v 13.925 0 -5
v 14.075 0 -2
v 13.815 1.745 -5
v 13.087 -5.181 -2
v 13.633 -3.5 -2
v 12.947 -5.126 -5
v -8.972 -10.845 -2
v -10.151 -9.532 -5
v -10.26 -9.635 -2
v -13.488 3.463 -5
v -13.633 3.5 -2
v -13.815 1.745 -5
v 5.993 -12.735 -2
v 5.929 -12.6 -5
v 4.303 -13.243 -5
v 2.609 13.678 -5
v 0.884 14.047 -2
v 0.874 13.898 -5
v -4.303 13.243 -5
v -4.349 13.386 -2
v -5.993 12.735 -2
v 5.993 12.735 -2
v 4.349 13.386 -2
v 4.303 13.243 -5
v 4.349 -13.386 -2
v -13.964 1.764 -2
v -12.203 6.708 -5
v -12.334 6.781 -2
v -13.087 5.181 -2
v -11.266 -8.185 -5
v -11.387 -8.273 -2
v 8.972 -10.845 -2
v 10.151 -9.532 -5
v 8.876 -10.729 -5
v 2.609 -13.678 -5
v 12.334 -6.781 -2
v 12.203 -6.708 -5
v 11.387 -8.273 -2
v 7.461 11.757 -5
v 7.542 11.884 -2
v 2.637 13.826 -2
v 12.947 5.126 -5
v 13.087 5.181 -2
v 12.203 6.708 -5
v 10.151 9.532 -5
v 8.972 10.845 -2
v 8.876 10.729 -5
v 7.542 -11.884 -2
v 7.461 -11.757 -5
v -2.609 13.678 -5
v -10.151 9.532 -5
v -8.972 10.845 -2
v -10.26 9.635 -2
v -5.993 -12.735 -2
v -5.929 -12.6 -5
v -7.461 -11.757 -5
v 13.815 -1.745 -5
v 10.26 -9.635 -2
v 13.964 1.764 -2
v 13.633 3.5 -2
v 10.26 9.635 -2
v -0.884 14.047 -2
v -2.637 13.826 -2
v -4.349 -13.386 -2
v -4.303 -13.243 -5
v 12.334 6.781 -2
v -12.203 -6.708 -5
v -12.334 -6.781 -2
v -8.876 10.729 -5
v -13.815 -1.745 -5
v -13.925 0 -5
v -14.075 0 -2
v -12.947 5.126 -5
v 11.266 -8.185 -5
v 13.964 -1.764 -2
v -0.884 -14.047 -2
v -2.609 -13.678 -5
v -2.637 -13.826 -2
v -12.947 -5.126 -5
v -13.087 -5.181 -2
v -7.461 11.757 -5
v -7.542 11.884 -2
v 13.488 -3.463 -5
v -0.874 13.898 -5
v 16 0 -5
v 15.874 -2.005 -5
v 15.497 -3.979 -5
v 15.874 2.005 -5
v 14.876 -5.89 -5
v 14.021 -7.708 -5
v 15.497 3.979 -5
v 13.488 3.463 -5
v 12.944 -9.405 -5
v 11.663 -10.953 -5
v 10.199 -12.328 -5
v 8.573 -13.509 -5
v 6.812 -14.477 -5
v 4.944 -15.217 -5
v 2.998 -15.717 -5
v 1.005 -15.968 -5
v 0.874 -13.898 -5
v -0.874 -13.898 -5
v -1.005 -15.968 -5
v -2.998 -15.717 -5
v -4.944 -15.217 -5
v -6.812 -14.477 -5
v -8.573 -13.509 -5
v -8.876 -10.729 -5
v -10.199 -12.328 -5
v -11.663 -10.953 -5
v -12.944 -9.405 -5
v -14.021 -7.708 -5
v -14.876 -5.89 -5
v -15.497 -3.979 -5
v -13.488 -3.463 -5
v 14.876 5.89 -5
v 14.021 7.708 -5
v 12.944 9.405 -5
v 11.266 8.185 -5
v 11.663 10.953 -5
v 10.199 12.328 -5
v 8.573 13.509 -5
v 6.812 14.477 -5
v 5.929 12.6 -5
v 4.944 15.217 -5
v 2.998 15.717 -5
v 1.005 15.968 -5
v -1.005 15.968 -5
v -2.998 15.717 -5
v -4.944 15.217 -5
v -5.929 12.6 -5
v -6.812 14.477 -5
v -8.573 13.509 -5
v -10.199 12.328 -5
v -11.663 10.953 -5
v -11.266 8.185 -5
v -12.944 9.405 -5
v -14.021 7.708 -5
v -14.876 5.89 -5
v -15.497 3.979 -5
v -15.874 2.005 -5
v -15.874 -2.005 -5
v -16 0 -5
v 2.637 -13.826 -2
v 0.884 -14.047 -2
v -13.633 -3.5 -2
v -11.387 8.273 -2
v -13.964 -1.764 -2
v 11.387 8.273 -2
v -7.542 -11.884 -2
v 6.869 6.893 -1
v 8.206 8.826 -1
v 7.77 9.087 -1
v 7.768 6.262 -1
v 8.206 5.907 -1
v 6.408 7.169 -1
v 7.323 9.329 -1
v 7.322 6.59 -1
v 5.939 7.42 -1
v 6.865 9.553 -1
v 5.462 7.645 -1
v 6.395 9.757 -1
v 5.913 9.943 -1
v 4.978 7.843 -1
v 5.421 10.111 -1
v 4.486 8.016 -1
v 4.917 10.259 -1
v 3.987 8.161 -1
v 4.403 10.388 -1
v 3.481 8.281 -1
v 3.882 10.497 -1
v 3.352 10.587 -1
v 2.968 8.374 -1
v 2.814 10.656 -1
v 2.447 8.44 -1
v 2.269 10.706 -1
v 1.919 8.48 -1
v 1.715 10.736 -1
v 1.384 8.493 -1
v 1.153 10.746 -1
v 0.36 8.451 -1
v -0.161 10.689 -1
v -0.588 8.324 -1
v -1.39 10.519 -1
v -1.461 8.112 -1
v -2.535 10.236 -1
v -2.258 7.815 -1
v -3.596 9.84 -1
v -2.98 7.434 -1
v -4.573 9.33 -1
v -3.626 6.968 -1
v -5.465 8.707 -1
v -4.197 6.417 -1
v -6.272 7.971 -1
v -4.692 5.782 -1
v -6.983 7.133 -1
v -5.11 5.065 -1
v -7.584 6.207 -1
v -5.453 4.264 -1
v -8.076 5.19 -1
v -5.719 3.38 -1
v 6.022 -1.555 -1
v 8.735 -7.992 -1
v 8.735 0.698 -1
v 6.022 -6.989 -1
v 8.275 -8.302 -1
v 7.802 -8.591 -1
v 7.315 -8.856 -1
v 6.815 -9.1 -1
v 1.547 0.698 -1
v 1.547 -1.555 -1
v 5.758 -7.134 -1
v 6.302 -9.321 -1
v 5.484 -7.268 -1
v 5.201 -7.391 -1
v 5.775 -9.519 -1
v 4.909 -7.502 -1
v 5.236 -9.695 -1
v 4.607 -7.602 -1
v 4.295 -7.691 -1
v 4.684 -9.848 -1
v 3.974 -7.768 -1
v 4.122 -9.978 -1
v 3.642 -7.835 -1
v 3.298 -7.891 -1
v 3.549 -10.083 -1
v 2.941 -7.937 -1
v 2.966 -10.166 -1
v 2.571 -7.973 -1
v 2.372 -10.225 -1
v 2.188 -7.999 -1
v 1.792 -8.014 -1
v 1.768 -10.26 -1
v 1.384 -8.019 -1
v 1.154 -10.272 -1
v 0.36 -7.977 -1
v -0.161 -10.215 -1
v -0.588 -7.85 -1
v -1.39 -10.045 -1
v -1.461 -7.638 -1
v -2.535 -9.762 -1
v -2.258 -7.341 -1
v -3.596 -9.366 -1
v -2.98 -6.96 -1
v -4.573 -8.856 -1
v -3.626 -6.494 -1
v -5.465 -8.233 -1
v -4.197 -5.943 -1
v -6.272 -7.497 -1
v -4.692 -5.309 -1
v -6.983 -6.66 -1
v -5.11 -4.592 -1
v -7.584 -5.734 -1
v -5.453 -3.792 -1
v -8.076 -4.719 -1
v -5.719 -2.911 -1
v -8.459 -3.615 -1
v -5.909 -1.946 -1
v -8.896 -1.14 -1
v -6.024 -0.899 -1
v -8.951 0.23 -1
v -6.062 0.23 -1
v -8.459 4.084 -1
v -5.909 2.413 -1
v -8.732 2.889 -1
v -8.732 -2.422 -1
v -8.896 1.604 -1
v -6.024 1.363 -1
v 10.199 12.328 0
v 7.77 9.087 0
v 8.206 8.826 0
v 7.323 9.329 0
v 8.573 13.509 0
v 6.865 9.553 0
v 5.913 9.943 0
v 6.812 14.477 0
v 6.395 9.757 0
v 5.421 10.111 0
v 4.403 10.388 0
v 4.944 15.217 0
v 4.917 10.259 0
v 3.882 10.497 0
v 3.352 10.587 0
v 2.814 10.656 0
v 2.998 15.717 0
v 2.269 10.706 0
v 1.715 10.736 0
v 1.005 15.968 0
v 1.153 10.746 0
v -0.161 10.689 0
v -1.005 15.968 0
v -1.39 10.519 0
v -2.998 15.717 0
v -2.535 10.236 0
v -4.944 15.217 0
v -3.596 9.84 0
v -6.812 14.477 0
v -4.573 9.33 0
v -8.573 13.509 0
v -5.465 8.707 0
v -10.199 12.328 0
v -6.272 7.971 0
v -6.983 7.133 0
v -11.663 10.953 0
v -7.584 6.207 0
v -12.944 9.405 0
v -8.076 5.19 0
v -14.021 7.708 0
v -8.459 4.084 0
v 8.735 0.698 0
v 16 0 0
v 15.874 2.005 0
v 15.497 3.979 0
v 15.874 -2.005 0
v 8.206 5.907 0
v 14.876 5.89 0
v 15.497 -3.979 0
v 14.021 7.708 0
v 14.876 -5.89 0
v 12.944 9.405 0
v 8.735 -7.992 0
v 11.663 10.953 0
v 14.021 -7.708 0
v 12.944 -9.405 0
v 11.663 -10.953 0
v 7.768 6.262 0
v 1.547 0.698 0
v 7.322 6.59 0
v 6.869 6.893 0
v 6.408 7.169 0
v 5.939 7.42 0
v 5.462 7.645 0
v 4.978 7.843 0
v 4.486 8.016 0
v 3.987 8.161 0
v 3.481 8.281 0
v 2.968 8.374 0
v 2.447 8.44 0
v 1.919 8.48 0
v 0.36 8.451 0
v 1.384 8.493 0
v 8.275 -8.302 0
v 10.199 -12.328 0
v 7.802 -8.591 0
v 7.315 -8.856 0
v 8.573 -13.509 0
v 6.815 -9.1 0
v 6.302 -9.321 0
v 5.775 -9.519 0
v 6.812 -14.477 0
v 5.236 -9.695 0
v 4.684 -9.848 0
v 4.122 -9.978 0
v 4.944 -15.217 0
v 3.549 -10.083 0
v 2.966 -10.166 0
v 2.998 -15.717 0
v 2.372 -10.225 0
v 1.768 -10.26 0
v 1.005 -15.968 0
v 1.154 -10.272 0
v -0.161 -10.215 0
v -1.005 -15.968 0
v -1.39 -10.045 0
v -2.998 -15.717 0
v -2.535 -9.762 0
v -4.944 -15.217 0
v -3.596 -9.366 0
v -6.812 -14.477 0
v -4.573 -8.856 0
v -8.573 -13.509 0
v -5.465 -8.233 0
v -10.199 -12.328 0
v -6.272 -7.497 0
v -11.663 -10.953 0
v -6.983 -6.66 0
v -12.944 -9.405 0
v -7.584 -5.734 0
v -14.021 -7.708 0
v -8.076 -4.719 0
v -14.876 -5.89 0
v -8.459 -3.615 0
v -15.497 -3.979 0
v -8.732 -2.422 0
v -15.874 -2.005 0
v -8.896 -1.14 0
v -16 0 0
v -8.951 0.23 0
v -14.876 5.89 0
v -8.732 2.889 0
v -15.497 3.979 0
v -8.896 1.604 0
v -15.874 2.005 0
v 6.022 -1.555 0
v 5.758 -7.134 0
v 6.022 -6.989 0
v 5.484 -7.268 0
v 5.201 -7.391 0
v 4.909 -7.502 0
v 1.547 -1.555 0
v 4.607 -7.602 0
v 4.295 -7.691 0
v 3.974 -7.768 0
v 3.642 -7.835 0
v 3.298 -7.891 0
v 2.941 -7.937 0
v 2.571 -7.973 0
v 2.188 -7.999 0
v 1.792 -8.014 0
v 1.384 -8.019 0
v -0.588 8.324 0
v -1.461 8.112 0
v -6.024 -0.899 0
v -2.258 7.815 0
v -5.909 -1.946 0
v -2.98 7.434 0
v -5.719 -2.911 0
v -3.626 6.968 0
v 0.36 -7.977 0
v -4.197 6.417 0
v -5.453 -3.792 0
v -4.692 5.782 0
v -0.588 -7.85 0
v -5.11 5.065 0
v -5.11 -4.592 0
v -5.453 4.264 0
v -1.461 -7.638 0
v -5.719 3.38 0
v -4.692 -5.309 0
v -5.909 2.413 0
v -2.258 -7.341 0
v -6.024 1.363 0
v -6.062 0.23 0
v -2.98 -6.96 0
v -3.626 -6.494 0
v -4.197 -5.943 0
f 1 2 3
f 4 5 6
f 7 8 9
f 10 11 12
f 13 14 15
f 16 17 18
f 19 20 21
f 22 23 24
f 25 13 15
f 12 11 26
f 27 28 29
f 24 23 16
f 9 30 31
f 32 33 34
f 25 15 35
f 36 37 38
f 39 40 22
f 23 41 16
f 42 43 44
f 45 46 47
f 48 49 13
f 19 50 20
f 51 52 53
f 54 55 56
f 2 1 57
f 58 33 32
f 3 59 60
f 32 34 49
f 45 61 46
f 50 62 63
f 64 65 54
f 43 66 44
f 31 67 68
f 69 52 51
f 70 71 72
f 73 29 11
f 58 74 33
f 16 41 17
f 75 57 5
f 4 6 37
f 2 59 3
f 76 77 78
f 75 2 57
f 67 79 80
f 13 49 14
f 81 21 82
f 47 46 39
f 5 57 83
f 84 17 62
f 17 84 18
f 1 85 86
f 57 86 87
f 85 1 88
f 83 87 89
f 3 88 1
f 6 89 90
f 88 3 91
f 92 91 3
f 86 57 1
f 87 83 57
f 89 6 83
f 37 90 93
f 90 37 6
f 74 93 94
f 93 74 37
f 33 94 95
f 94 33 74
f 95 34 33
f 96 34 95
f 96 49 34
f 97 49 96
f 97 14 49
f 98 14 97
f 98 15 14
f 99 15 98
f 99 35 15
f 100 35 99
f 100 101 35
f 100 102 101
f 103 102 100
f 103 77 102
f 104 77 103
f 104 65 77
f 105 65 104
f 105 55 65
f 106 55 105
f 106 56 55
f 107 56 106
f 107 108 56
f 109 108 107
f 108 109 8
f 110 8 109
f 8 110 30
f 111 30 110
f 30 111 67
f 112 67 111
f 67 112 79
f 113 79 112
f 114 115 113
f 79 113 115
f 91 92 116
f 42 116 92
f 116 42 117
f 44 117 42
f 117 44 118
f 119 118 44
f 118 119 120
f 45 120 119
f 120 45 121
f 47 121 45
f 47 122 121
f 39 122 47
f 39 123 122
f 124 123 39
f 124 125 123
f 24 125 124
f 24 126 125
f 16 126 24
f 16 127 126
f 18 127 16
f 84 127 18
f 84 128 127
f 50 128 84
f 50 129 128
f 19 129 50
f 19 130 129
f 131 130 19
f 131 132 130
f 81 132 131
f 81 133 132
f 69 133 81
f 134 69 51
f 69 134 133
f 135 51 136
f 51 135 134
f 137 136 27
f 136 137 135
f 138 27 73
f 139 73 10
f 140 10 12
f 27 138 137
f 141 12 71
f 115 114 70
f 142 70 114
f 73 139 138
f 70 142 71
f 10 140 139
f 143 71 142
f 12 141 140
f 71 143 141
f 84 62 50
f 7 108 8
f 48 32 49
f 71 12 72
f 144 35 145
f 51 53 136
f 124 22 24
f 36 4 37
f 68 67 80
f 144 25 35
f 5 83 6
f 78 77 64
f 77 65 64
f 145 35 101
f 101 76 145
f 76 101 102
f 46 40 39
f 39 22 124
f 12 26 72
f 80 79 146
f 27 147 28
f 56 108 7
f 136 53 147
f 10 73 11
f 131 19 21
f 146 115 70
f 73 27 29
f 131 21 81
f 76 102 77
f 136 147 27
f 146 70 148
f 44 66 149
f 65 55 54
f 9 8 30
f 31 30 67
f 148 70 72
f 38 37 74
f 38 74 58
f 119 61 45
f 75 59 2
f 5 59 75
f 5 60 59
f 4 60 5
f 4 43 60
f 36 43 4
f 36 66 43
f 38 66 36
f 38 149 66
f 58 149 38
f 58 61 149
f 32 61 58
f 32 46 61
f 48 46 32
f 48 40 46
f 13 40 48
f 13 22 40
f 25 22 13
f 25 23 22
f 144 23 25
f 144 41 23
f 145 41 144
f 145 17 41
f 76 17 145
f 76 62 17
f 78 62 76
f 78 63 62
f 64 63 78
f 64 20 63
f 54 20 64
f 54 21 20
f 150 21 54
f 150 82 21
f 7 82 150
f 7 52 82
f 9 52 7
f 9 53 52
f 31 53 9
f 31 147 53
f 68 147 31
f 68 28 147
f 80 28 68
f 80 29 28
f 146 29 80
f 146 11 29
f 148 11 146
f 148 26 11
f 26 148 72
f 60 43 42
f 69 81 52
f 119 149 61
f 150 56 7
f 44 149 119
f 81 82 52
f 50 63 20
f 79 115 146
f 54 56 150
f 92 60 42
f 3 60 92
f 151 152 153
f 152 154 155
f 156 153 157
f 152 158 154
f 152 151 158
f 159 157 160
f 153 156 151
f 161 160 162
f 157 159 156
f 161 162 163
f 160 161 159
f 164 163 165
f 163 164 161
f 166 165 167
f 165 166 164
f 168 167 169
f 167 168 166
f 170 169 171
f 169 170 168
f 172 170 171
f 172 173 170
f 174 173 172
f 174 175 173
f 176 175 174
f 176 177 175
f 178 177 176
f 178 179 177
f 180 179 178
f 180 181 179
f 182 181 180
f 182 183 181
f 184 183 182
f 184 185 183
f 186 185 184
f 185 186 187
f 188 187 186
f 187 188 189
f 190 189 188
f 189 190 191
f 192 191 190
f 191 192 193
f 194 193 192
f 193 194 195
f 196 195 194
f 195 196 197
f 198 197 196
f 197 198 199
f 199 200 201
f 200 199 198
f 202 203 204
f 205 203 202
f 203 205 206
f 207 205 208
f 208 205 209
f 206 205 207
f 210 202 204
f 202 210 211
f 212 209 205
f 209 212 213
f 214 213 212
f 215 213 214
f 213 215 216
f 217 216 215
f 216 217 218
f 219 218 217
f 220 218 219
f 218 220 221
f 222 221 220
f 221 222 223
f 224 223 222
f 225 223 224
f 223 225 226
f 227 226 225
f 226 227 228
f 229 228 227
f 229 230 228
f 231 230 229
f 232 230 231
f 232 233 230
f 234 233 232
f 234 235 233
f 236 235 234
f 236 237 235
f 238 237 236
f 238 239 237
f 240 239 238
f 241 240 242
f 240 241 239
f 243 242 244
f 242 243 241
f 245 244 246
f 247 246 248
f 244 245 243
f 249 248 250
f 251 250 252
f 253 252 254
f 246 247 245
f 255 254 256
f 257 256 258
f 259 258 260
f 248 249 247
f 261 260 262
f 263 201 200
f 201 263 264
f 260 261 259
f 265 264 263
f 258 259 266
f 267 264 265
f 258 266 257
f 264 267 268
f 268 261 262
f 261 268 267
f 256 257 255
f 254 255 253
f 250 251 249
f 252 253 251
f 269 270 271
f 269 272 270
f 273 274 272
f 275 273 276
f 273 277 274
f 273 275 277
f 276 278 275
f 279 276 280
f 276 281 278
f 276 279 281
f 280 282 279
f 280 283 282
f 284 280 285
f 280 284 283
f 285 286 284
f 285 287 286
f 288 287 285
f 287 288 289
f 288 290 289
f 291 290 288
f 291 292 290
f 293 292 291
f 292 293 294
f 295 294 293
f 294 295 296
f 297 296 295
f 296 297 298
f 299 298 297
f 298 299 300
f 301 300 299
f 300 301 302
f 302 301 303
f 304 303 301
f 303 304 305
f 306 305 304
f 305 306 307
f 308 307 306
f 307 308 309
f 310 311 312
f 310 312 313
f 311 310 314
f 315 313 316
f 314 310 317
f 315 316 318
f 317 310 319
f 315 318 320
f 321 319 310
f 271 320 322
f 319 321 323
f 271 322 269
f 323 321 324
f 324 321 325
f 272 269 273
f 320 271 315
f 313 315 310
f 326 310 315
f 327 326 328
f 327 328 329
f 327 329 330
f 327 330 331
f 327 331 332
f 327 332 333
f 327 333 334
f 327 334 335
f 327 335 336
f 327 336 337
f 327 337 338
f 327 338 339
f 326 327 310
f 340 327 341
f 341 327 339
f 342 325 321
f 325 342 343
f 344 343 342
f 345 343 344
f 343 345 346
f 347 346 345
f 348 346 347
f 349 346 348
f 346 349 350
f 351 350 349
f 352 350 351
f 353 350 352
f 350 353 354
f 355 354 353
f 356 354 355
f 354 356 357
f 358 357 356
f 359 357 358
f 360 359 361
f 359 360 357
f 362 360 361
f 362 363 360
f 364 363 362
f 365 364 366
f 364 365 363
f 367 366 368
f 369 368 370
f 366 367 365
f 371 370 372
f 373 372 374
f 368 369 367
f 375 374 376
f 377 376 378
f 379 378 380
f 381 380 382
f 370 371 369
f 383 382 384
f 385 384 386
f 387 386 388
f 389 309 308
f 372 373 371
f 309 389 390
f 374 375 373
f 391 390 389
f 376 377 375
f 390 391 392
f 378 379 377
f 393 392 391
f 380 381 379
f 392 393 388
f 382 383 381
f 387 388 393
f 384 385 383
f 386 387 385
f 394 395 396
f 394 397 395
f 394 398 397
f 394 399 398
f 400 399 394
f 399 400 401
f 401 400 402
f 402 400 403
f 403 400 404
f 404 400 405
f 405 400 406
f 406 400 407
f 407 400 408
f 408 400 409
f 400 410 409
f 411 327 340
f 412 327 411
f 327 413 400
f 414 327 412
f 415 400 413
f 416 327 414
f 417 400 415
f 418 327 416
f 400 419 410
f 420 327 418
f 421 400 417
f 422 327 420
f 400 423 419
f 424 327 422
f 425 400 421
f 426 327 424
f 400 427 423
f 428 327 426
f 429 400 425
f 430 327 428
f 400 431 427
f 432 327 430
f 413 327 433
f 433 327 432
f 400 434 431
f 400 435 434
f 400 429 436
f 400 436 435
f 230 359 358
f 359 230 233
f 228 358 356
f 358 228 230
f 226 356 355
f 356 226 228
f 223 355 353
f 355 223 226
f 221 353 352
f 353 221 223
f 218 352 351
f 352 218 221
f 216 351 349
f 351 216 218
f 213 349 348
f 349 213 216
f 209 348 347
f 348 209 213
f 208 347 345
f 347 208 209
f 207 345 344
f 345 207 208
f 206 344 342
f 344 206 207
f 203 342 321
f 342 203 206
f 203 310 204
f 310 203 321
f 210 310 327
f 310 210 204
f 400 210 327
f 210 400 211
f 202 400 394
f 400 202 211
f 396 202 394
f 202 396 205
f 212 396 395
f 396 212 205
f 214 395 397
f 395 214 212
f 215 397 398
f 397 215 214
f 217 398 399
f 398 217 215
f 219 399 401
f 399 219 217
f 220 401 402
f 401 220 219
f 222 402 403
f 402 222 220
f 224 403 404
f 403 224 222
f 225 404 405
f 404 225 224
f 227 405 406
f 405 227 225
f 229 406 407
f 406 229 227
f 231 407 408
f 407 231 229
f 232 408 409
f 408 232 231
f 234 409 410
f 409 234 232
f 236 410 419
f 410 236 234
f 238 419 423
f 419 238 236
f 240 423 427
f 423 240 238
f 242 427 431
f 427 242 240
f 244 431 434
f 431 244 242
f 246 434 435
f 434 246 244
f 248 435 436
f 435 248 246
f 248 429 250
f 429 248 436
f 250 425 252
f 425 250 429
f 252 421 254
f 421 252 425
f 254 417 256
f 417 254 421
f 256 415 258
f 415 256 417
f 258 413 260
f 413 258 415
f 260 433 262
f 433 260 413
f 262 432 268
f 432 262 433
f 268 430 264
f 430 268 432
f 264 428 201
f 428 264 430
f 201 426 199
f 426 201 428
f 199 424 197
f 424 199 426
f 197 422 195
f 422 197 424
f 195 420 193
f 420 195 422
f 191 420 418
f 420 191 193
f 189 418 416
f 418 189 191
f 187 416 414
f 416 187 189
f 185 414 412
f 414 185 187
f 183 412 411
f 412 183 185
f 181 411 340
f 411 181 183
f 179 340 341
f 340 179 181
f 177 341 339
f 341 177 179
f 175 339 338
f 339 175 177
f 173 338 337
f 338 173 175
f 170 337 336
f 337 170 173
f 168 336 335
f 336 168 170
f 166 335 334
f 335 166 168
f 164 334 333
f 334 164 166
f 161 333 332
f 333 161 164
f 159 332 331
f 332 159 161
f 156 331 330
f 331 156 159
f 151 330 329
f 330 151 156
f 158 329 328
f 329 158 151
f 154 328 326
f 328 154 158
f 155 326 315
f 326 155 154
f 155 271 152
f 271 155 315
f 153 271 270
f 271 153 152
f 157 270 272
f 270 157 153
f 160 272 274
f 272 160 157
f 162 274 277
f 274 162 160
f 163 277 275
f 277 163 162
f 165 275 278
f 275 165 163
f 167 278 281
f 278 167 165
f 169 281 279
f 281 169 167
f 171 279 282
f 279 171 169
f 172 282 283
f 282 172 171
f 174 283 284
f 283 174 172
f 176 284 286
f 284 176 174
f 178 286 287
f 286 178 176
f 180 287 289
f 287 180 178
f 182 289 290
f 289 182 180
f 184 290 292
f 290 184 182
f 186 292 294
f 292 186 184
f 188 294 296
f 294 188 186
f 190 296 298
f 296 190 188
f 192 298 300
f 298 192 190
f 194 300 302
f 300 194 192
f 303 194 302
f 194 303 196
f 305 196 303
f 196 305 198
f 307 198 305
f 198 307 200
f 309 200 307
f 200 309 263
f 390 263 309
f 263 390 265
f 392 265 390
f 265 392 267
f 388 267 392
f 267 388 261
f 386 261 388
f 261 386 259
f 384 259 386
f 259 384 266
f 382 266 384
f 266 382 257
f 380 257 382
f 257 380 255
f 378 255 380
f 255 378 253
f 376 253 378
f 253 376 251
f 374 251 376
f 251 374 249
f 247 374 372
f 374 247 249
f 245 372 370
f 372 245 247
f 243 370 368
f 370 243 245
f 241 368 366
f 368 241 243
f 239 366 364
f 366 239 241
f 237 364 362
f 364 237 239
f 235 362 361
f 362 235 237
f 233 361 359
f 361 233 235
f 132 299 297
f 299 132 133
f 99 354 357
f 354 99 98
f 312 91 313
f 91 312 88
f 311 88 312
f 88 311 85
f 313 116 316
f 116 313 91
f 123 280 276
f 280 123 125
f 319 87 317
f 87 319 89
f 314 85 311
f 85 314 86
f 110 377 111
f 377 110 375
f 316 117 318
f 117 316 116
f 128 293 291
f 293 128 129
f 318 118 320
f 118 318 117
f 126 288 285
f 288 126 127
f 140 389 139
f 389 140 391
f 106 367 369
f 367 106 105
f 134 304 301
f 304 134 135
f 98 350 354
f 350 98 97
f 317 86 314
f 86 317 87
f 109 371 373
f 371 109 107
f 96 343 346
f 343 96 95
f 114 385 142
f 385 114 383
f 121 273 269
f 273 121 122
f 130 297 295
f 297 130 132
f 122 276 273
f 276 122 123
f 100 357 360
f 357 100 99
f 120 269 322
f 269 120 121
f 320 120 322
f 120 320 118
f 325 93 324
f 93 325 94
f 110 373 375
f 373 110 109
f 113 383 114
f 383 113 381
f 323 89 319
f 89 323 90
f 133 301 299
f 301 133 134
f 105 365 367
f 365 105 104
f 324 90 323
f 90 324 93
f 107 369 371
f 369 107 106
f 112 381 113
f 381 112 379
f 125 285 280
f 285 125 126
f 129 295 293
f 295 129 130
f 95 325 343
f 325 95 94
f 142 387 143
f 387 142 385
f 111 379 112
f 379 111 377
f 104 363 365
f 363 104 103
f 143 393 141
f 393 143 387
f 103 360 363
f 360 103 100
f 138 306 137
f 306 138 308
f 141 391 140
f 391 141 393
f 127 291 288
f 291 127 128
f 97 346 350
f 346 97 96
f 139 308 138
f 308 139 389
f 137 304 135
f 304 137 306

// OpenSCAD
$fn = 50;


difference() {
	union() {
		translate(v = [0, 0, -5.0000000000]) {
			cylinder(h = 5, r = 16.0000000000);
		}
	}
	union() {
		#translate(v = [0, 0, -5.0000000000]) {
			cylinder(h = 3, r1 = 13.9250000000, r2 = 14.0750000000);
		}
		translate(v = [0, 0, -1]) {
			linear_extrude(height = 1) {
				text(font = "Impact", halign = "center", size = 20, text = "G", valign = "center");
			}
		}
	}
}
